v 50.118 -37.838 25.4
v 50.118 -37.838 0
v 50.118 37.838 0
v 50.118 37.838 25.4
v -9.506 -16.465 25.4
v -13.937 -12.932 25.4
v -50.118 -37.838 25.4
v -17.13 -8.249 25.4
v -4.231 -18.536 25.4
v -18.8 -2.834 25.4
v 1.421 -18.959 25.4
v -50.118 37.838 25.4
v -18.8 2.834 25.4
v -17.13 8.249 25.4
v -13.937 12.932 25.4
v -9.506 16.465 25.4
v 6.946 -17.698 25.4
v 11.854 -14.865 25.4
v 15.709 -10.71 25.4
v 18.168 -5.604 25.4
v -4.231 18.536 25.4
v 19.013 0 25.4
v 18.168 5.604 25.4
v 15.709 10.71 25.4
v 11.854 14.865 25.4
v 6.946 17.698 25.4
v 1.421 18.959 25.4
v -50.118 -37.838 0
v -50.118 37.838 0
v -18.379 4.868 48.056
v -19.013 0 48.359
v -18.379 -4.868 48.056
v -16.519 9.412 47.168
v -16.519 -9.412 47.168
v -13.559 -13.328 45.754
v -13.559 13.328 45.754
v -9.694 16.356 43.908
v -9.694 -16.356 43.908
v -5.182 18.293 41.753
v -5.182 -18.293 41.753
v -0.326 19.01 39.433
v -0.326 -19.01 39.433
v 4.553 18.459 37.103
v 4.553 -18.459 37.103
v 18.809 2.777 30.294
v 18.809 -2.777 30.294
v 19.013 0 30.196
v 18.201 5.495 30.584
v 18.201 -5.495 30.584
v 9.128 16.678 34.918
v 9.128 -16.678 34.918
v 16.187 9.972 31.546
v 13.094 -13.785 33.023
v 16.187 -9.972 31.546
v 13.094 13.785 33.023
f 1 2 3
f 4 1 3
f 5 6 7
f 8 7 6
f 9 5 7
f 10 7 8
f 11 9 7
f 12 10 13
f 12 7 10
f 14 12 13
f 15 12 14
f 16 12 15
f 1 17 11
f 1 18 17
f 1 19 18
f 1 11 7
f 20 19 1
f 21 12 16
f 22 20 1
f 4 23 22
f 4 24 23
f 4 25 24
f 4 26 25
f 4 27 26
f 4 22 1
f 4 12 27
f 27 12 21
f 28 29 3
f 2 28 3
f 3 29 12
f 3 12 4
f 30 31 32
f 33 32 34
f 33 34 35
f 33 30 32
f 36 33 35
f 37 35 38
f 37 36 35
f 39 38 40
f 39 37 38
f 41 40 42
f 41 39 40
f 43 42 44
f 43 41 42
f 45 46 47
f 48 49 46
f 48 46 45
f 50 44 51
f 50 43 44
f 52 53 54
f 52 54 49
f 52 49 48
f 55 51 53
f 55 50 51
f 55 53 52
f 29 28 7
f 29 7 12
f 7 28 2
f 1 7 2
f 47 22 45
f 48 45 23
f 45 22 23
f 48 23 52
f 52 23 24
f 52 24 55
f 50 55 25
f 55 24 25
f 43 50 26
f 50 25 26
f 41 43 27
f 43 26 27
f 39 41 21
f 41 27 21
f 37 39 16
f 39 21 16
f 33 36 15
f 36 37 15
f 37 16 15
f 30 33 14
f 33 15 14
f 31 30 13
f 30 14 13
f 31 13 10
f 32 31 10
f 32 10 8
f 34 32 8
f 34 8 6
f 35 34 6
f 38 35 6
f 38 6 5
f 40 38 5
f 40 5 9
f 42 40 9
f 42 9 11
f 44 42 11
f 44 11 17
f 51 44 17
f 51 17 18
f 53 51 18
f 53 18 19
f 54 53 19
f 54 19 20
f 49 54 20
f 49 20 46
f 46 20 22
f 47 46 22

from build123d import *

# Parameters (mm, degrees)
F0_W          = 100.2360209823
F0_H          = 75.6767615676
F1_DEPTH      = 25.4
F2_R          = 19.0125799506
F3_DEPTH      = 25.4
F5_DEPTH      = 37.8393807838
F5_DEPTH_BACK = 37.8393807838


with BuildPart() as f1:
    # F0 (on Top) → F1 (new body)
    with BuildSketch(Plane.XY):
        Rectangle(F0_W, F0_H)
    extrude(amount=F1_DEPTH)

    # F2 (on face) → F3 (join)
    with BuildSketch(Plane.XY.offset(25.4)):
        Circle(F2_R)
    extrude(amount=F3_DEPTH)

    # F4 (on Front) → F5 (cut, two sides)
    with BuildSketch(Plane.XZ) as f5_sk:
        Polygon((-21.6138623655, 59.192981571), (-21.6138623655, 49.6012866497), (21.2963428348, 29.1053559631), (21.2963428348, 59.192981571), align=None)
    extrude(amount=-F5_DEPTH, mode=Mode.SUBTRACT)
    extrude(f5_sk.sketch, amount=F5_DEPTH_BACK, mode=Mode.SUBTRACT)


solid = f1.part
